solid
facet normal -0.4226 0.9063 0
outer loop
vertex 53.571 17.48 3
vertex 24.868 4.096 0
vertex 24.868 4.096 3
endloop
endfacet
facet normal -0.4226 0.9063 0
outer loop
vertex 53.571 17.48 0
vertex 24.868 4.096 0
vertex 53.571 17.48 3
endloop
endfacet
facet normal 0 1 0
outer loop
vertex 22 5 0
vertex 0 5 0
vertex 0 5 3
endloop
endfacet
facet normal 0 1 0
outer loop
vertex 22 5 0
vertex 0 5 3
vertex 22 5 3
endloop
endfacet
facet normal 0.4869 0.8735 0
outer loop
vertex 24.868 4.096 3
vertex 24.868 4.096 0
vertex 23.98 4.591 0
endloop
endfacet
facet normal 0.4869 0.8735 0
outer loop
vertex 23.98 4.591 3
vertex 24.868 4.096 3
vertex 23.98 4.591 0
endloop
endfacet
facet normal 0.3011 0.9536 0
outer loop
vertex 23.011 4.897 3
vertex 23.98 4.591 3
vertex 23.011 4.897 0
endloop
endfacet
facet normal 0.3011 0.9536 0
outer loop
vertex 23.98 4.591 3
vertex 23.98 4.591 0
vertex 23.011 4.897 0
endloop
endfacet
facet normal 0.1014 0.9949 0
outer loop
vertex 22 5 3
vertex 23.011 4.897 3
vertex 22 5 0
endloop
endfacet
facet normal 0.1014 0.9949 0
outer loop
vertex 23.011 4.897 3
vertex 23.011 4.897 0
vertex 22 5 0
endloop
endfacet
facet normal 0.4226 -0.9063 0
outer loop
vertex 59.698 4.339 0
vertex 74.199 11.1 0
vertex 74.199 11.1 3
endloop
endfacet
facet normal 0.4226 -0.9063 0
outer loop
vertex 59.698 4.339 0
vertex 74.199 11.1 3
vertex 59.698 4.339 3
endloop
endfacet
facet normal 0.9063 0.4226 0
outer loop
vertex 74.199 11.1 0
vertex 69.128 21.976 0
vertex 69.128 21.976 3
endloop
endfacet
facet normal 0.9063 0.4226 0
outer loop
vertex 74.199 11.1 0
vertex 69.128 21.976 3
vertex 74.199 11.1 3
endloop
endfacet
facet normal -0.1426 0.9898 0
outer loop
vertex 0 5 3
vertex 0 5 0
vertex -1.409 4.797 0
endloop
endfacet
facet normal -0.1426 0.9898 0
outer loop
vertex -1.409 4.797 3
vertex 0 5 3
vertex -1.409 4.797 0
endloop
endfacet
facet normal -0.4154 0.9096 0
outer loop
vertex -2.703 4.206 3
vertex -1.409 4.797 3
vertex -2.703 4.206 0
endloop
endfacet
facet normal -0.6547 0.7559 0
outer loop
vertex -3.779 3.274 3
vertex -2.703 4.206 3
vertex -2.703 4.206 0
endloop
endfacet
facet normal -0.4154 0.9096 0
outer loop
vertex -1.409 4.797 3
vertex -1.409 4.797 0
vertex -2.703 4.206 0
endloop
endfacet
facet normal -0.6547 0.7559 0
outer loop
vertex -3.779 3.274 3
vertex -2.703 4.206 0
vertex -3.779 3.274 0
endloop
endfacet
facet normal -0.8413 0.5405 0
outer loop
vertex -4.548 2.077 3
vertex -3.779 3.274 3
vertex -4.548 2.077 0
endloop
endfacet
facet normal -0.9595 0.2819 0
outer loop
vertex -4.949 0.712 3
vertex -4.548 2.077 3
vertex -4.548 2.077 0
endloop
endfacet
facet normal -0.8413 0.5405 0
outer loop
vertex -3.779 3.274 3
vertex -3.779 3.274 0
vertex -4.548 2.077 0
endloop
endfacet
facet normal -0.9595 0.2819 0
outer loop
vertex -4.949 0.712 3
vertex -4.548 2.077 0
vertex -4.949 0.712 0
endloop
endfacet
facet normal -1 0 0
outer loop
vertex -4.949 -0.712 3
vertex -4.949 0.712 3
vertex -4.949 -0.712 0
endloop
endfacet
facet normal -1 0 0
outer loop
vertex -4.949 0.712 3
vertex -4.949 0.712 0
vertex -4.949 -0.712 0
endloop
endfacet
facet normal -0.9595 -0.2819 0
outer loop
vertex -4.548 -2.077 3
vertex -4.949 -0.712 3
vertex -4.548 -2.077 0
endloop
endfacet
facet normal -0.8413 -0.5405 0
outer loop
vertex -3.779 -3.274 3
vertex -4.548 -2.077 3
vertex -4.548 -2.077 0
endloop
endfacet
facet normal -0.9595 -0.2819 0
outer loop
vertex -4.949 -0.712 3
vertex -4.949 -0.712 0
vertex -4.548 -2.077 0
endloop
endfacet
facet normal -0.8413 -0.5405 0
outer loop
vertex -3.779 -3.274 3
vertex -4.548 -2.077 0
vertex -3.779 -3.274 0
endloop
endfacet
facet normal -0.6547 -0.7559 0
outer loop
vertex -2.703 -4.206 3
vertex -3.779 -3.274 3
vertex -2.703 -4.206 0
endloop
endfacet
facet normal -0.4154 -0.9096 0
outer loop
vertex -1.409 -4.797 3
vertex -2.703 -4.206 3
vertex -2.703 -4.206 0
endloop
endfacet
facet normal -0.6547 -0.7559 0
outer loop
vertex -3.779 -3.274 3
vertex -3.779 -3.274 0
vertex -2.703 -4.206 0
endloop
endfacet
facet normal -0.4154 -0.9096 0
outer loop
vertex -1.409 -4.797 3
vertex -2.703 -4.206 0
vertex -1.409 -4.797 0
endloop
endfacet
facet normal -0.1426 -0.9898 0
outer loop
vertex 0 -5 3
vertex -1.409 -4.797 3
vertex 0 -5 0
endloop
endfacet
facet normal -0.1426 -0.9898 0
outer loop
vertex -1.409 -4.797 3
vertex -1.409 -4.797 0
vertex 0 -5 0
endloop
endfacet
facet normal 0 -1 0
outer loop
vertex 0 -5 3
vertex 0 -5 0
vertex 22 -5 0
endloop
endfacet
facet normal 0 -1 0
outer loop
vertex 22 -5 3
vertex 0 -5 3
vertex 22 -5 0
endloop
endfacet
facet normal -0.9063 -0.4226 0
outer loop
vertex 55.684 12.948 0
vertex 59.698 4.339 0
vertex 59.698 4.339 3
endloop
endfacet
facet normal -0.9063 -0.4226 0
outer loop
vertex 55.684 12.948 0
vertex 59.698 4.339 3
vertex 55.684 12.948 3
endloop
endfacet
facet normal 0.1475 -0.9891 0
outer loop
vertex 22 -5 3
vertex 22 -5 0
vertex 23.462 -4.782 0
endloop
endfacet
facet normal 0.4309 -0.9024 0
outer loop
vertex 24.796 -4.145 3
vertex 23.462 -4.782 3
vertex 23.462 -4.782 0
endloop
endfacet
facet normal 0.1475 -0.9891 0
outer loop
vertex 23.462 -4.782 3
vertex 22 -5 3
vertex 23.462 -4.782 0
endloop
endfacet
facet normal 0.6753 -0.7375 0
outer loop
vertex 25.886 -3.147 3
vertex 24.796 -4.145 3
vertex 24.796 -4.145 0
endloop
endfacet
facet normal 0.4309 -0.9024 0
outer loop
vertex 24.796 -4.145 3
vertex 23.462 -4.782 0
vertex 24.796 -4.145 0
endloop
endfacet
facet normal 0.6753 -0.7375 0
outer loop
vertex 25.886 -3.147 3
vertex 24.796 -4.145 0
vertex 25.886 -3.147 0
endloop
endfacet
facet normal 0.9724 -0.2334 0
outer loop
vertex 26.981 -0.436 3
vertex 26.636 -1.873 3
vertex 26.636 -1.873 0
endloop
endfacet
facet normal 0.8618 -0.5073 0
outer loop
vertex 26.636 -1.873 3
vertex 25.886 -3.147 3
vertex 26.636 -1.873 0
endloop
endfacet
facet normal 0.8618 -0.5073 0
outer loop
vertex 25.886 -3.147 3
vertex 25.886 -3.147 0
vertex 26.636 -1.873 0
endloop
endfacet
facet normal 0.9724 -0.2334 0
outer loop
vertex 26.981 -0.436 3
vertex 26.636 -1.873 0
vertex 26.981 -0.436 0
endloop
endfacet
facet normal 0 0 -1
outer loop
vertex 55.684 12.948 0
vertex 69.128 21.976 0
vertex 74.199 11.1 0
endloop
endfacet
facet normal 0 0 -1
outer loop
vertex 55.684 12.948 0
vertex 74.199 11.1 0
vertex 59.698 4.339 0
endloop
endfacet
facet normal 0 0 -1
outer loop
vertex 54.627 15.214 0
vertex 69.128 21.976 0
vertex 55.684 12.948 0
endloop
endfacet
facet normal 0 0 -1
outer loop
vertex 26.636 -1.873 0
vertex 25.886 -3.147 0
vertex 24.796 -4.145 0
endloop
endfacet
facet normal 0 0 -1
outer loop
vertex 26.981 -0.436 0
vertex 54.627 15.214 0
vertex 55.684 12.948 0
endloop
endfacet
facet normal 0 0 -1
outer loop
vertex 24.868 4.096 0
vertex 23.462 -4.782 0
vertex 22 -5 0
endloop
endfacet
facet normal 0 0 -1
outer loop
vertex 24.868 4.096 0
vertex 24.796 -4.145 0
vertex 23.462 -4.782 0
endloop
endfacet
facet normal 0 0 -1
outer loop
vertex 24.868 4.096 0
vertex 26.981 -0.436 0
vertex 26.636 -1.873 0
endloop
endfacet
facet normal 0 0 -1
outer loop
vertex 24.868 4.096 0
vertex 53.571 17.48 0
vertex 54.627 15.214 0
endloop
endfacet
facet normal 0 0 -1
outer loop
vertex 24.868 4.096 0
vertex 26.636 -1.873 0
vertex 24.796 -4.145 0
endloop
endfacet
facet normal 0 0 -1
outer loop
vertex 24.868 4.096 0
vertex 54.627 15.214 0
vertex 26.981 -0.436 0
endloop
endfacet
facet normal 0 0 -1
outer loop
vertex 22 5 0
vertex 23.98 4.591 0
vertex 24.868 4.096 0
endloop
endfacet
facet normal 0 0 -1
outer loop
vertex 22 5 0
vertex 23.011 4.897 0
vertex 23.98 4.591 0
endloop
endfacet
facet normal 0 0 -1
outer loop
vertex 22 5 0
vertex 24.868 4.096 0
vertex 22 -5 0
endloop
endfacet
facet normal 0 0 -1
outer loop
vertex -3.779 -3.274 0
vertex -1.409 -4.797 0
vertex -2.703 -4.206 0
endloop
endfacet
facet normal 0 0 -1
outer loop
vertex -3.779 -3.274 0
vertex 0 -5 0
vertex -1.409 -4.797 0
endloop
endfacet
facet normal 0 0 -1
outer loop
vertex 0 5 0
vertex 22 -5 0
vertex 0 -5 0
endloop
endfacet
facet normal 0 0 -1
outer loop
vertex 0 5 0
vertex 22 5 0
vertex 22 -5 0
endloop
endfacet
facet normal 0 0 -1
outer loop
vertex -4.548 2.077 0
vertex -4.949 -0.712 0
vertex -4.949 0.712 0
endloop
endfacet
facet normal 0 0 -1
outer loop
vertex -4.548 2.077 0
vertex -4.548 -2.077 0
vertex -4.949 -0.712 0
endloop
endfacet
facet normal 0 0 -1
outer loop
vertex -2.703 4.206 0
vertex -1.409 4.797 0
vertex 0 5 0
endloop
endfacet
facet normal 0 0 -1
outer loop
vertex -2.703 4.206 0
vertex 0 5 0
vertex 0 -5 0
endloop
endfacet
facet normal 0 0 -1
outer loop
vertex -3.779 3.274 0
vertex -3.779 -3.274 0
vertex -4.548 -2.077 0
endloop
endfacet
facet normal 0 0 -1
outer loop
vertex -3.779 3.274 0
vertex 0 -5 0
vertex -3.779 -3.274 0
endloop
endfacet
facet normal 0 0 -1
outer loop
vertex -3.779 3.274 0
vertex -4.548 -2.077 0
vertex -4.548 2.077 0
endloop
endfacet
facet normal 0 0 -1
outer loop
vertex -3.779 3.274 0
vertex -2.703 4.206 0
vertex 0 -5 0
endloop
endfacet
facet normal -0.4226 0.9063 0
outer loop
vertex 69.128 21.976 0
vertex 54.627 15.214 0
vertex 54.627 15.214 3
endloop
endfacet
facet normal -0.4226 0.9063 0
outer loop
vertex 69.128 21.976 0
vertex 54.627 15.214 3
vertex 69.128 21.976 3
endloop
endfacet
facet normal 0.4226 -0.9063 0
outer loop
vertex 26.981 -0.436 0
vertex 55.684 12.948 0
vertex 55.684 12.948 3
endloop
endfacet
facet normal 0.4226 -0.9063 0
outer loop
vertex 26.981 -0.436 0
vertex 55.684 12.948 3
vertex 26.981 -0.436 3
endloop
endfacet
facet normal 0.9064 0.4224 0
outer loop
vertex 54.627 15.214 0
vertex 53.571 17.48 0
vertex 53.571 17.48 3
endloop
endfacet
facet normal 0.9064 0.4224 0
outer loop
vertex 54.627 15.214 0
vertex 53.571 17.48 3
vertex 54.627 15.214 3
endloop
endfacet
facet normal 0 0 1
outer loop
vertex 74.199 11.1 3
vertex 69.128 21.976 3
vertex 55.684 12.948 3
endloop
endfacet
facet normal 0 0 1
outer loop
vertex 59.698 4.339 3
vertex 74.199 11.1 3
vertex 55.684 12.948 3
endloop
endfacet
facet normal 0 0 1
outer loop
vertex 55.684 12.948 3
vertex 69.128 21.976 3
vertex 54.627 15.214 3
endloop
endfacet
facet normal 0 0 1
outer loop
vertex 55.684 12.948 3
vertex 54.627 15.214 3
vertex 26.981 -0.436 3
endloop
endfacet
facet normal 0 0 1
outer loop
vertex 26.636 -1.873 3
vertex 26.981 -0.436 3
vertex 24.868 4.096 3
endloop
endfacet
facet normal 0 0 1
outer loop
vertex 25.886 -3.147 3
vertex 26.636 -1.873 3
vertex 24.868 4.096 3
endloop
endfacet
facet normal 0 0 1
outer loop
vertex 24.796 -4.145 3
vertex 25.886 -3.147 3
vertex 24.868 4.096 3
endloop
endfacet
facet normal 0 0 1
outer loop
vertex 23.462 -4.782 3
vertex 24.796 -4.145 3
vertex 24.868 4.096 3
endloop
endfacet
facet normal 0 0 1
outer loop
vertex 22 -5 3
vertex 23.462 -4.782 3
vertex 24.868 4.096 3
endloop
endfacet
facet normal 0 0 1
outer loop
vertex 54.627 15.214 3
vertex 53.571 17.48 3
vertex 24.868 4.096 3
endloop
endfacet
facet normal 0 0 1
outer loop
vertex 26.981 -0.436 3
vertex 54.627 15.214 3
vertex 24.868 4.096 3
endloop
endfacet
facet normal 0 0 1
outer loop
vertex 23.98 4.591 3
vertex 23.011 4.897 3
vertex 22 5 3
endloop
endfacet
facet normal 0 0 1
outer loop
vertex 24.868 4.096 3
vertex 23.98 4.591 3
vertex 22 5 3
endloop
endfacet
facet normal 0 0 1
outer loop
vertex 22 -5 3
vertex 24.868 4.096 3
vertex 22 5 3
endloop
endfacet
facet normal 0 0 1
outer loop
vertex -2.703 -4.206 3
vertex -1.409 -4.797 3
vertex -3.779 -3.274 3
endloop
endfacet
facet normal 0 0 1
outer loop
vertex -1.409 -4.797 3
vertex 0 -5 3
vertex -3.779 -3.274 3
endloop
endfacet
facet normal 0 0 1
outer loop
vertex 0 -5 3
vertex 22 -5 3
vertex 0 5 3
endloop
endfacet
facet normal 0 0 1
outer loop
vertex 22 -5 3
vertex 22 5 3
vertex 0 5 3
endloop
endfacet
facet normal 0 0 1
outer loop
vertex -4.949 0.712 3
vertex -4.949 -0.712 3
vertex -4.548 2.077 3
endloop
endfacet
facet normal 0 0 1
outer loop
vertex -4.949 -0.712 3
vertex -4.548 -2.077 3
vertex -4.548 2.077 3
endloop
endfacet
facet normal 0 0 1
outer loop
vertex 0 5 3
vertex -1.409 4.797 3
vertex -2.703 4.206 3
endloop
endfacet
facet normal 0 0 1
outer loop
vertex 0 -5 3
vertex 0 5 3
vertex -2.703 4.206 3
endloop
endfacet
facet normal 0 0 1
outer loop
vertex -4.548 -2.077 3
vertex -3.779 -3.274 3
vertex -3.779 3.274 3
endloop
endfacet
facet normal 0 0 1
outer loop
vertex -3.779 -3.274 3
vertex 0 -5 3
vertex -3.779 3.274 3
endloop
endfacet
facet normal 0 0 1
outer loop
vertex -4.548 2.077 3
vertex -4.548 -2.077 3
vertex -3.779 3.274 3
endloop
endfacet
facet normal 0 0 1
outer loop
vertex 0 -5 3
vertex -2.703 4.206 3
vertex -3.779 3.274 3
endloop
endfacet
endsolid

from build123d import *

# Parameters (mm, degrees)
SKETCH1_R           = 5
BOSS_EXTRUDE1_DEPTH = 3
SKETCH2_W           = 22
SKETCH2_H           = 10
BOSS_EXTRUDE2_DEPTH = 3
SKETCH3_R           = 5
BOSS_EXTRUDE3_DEPTH = 3
BOSS_EXTRUDE4_DEPTH = 3
BOSS_EXTRUDE5_DEPTH = 3


with BuildPart() as part:
    # Sketch1 → Boss-Extrude1 (new body)
    with BuildSketch(Plane.XY):
        Circle(SKETCH1_R)
    extrude(amount=BOSS_EXTRUDE1_DEPTH)

    # Sketch2 → Boss-Extrude2 (add)
    with BuildSketch(Plane.XY):
        with Locations((11, 0)):
            Rectangle(SKETCH2_W, SKETCH2_H)
    extrude(amount=BOSS_EXTRUDE2_DEPTH)

    # Sketch3 → Boss-Extrude3 (add)
    with BuildSketch(Plane.XY):
        with Locations((22, 0)):
            Circle(SKETCH3_R)
    extrude(amount=BOSS_EXTRUDE3_DEPTH)

    # Sketch4 → Boss-Extrude4 (add)
    with BuildSketch(Plane.XY):
        Polygon((20.943454346, 2.265769468), (53.570534679, 17.48002689), (55.683625988, 12.948487955), (23.056545654, -2.265769468), align=None)
    extrude(amount=BOSS_EXTRUDE4_DEPTH)

    # Sketch5 → Boss-Extrude5 (add)
    with BuildSketch(Plane.XY):
        Polygon((54.627080333, 15.214257423), (69.128004926, 21.976149611), (74.199424067, 11.100456166), (59.698499474, 4.338563978), align=None)
    extrude(amount=BOSS_EXTRUDE5_DEPTH)


solid = part.part
